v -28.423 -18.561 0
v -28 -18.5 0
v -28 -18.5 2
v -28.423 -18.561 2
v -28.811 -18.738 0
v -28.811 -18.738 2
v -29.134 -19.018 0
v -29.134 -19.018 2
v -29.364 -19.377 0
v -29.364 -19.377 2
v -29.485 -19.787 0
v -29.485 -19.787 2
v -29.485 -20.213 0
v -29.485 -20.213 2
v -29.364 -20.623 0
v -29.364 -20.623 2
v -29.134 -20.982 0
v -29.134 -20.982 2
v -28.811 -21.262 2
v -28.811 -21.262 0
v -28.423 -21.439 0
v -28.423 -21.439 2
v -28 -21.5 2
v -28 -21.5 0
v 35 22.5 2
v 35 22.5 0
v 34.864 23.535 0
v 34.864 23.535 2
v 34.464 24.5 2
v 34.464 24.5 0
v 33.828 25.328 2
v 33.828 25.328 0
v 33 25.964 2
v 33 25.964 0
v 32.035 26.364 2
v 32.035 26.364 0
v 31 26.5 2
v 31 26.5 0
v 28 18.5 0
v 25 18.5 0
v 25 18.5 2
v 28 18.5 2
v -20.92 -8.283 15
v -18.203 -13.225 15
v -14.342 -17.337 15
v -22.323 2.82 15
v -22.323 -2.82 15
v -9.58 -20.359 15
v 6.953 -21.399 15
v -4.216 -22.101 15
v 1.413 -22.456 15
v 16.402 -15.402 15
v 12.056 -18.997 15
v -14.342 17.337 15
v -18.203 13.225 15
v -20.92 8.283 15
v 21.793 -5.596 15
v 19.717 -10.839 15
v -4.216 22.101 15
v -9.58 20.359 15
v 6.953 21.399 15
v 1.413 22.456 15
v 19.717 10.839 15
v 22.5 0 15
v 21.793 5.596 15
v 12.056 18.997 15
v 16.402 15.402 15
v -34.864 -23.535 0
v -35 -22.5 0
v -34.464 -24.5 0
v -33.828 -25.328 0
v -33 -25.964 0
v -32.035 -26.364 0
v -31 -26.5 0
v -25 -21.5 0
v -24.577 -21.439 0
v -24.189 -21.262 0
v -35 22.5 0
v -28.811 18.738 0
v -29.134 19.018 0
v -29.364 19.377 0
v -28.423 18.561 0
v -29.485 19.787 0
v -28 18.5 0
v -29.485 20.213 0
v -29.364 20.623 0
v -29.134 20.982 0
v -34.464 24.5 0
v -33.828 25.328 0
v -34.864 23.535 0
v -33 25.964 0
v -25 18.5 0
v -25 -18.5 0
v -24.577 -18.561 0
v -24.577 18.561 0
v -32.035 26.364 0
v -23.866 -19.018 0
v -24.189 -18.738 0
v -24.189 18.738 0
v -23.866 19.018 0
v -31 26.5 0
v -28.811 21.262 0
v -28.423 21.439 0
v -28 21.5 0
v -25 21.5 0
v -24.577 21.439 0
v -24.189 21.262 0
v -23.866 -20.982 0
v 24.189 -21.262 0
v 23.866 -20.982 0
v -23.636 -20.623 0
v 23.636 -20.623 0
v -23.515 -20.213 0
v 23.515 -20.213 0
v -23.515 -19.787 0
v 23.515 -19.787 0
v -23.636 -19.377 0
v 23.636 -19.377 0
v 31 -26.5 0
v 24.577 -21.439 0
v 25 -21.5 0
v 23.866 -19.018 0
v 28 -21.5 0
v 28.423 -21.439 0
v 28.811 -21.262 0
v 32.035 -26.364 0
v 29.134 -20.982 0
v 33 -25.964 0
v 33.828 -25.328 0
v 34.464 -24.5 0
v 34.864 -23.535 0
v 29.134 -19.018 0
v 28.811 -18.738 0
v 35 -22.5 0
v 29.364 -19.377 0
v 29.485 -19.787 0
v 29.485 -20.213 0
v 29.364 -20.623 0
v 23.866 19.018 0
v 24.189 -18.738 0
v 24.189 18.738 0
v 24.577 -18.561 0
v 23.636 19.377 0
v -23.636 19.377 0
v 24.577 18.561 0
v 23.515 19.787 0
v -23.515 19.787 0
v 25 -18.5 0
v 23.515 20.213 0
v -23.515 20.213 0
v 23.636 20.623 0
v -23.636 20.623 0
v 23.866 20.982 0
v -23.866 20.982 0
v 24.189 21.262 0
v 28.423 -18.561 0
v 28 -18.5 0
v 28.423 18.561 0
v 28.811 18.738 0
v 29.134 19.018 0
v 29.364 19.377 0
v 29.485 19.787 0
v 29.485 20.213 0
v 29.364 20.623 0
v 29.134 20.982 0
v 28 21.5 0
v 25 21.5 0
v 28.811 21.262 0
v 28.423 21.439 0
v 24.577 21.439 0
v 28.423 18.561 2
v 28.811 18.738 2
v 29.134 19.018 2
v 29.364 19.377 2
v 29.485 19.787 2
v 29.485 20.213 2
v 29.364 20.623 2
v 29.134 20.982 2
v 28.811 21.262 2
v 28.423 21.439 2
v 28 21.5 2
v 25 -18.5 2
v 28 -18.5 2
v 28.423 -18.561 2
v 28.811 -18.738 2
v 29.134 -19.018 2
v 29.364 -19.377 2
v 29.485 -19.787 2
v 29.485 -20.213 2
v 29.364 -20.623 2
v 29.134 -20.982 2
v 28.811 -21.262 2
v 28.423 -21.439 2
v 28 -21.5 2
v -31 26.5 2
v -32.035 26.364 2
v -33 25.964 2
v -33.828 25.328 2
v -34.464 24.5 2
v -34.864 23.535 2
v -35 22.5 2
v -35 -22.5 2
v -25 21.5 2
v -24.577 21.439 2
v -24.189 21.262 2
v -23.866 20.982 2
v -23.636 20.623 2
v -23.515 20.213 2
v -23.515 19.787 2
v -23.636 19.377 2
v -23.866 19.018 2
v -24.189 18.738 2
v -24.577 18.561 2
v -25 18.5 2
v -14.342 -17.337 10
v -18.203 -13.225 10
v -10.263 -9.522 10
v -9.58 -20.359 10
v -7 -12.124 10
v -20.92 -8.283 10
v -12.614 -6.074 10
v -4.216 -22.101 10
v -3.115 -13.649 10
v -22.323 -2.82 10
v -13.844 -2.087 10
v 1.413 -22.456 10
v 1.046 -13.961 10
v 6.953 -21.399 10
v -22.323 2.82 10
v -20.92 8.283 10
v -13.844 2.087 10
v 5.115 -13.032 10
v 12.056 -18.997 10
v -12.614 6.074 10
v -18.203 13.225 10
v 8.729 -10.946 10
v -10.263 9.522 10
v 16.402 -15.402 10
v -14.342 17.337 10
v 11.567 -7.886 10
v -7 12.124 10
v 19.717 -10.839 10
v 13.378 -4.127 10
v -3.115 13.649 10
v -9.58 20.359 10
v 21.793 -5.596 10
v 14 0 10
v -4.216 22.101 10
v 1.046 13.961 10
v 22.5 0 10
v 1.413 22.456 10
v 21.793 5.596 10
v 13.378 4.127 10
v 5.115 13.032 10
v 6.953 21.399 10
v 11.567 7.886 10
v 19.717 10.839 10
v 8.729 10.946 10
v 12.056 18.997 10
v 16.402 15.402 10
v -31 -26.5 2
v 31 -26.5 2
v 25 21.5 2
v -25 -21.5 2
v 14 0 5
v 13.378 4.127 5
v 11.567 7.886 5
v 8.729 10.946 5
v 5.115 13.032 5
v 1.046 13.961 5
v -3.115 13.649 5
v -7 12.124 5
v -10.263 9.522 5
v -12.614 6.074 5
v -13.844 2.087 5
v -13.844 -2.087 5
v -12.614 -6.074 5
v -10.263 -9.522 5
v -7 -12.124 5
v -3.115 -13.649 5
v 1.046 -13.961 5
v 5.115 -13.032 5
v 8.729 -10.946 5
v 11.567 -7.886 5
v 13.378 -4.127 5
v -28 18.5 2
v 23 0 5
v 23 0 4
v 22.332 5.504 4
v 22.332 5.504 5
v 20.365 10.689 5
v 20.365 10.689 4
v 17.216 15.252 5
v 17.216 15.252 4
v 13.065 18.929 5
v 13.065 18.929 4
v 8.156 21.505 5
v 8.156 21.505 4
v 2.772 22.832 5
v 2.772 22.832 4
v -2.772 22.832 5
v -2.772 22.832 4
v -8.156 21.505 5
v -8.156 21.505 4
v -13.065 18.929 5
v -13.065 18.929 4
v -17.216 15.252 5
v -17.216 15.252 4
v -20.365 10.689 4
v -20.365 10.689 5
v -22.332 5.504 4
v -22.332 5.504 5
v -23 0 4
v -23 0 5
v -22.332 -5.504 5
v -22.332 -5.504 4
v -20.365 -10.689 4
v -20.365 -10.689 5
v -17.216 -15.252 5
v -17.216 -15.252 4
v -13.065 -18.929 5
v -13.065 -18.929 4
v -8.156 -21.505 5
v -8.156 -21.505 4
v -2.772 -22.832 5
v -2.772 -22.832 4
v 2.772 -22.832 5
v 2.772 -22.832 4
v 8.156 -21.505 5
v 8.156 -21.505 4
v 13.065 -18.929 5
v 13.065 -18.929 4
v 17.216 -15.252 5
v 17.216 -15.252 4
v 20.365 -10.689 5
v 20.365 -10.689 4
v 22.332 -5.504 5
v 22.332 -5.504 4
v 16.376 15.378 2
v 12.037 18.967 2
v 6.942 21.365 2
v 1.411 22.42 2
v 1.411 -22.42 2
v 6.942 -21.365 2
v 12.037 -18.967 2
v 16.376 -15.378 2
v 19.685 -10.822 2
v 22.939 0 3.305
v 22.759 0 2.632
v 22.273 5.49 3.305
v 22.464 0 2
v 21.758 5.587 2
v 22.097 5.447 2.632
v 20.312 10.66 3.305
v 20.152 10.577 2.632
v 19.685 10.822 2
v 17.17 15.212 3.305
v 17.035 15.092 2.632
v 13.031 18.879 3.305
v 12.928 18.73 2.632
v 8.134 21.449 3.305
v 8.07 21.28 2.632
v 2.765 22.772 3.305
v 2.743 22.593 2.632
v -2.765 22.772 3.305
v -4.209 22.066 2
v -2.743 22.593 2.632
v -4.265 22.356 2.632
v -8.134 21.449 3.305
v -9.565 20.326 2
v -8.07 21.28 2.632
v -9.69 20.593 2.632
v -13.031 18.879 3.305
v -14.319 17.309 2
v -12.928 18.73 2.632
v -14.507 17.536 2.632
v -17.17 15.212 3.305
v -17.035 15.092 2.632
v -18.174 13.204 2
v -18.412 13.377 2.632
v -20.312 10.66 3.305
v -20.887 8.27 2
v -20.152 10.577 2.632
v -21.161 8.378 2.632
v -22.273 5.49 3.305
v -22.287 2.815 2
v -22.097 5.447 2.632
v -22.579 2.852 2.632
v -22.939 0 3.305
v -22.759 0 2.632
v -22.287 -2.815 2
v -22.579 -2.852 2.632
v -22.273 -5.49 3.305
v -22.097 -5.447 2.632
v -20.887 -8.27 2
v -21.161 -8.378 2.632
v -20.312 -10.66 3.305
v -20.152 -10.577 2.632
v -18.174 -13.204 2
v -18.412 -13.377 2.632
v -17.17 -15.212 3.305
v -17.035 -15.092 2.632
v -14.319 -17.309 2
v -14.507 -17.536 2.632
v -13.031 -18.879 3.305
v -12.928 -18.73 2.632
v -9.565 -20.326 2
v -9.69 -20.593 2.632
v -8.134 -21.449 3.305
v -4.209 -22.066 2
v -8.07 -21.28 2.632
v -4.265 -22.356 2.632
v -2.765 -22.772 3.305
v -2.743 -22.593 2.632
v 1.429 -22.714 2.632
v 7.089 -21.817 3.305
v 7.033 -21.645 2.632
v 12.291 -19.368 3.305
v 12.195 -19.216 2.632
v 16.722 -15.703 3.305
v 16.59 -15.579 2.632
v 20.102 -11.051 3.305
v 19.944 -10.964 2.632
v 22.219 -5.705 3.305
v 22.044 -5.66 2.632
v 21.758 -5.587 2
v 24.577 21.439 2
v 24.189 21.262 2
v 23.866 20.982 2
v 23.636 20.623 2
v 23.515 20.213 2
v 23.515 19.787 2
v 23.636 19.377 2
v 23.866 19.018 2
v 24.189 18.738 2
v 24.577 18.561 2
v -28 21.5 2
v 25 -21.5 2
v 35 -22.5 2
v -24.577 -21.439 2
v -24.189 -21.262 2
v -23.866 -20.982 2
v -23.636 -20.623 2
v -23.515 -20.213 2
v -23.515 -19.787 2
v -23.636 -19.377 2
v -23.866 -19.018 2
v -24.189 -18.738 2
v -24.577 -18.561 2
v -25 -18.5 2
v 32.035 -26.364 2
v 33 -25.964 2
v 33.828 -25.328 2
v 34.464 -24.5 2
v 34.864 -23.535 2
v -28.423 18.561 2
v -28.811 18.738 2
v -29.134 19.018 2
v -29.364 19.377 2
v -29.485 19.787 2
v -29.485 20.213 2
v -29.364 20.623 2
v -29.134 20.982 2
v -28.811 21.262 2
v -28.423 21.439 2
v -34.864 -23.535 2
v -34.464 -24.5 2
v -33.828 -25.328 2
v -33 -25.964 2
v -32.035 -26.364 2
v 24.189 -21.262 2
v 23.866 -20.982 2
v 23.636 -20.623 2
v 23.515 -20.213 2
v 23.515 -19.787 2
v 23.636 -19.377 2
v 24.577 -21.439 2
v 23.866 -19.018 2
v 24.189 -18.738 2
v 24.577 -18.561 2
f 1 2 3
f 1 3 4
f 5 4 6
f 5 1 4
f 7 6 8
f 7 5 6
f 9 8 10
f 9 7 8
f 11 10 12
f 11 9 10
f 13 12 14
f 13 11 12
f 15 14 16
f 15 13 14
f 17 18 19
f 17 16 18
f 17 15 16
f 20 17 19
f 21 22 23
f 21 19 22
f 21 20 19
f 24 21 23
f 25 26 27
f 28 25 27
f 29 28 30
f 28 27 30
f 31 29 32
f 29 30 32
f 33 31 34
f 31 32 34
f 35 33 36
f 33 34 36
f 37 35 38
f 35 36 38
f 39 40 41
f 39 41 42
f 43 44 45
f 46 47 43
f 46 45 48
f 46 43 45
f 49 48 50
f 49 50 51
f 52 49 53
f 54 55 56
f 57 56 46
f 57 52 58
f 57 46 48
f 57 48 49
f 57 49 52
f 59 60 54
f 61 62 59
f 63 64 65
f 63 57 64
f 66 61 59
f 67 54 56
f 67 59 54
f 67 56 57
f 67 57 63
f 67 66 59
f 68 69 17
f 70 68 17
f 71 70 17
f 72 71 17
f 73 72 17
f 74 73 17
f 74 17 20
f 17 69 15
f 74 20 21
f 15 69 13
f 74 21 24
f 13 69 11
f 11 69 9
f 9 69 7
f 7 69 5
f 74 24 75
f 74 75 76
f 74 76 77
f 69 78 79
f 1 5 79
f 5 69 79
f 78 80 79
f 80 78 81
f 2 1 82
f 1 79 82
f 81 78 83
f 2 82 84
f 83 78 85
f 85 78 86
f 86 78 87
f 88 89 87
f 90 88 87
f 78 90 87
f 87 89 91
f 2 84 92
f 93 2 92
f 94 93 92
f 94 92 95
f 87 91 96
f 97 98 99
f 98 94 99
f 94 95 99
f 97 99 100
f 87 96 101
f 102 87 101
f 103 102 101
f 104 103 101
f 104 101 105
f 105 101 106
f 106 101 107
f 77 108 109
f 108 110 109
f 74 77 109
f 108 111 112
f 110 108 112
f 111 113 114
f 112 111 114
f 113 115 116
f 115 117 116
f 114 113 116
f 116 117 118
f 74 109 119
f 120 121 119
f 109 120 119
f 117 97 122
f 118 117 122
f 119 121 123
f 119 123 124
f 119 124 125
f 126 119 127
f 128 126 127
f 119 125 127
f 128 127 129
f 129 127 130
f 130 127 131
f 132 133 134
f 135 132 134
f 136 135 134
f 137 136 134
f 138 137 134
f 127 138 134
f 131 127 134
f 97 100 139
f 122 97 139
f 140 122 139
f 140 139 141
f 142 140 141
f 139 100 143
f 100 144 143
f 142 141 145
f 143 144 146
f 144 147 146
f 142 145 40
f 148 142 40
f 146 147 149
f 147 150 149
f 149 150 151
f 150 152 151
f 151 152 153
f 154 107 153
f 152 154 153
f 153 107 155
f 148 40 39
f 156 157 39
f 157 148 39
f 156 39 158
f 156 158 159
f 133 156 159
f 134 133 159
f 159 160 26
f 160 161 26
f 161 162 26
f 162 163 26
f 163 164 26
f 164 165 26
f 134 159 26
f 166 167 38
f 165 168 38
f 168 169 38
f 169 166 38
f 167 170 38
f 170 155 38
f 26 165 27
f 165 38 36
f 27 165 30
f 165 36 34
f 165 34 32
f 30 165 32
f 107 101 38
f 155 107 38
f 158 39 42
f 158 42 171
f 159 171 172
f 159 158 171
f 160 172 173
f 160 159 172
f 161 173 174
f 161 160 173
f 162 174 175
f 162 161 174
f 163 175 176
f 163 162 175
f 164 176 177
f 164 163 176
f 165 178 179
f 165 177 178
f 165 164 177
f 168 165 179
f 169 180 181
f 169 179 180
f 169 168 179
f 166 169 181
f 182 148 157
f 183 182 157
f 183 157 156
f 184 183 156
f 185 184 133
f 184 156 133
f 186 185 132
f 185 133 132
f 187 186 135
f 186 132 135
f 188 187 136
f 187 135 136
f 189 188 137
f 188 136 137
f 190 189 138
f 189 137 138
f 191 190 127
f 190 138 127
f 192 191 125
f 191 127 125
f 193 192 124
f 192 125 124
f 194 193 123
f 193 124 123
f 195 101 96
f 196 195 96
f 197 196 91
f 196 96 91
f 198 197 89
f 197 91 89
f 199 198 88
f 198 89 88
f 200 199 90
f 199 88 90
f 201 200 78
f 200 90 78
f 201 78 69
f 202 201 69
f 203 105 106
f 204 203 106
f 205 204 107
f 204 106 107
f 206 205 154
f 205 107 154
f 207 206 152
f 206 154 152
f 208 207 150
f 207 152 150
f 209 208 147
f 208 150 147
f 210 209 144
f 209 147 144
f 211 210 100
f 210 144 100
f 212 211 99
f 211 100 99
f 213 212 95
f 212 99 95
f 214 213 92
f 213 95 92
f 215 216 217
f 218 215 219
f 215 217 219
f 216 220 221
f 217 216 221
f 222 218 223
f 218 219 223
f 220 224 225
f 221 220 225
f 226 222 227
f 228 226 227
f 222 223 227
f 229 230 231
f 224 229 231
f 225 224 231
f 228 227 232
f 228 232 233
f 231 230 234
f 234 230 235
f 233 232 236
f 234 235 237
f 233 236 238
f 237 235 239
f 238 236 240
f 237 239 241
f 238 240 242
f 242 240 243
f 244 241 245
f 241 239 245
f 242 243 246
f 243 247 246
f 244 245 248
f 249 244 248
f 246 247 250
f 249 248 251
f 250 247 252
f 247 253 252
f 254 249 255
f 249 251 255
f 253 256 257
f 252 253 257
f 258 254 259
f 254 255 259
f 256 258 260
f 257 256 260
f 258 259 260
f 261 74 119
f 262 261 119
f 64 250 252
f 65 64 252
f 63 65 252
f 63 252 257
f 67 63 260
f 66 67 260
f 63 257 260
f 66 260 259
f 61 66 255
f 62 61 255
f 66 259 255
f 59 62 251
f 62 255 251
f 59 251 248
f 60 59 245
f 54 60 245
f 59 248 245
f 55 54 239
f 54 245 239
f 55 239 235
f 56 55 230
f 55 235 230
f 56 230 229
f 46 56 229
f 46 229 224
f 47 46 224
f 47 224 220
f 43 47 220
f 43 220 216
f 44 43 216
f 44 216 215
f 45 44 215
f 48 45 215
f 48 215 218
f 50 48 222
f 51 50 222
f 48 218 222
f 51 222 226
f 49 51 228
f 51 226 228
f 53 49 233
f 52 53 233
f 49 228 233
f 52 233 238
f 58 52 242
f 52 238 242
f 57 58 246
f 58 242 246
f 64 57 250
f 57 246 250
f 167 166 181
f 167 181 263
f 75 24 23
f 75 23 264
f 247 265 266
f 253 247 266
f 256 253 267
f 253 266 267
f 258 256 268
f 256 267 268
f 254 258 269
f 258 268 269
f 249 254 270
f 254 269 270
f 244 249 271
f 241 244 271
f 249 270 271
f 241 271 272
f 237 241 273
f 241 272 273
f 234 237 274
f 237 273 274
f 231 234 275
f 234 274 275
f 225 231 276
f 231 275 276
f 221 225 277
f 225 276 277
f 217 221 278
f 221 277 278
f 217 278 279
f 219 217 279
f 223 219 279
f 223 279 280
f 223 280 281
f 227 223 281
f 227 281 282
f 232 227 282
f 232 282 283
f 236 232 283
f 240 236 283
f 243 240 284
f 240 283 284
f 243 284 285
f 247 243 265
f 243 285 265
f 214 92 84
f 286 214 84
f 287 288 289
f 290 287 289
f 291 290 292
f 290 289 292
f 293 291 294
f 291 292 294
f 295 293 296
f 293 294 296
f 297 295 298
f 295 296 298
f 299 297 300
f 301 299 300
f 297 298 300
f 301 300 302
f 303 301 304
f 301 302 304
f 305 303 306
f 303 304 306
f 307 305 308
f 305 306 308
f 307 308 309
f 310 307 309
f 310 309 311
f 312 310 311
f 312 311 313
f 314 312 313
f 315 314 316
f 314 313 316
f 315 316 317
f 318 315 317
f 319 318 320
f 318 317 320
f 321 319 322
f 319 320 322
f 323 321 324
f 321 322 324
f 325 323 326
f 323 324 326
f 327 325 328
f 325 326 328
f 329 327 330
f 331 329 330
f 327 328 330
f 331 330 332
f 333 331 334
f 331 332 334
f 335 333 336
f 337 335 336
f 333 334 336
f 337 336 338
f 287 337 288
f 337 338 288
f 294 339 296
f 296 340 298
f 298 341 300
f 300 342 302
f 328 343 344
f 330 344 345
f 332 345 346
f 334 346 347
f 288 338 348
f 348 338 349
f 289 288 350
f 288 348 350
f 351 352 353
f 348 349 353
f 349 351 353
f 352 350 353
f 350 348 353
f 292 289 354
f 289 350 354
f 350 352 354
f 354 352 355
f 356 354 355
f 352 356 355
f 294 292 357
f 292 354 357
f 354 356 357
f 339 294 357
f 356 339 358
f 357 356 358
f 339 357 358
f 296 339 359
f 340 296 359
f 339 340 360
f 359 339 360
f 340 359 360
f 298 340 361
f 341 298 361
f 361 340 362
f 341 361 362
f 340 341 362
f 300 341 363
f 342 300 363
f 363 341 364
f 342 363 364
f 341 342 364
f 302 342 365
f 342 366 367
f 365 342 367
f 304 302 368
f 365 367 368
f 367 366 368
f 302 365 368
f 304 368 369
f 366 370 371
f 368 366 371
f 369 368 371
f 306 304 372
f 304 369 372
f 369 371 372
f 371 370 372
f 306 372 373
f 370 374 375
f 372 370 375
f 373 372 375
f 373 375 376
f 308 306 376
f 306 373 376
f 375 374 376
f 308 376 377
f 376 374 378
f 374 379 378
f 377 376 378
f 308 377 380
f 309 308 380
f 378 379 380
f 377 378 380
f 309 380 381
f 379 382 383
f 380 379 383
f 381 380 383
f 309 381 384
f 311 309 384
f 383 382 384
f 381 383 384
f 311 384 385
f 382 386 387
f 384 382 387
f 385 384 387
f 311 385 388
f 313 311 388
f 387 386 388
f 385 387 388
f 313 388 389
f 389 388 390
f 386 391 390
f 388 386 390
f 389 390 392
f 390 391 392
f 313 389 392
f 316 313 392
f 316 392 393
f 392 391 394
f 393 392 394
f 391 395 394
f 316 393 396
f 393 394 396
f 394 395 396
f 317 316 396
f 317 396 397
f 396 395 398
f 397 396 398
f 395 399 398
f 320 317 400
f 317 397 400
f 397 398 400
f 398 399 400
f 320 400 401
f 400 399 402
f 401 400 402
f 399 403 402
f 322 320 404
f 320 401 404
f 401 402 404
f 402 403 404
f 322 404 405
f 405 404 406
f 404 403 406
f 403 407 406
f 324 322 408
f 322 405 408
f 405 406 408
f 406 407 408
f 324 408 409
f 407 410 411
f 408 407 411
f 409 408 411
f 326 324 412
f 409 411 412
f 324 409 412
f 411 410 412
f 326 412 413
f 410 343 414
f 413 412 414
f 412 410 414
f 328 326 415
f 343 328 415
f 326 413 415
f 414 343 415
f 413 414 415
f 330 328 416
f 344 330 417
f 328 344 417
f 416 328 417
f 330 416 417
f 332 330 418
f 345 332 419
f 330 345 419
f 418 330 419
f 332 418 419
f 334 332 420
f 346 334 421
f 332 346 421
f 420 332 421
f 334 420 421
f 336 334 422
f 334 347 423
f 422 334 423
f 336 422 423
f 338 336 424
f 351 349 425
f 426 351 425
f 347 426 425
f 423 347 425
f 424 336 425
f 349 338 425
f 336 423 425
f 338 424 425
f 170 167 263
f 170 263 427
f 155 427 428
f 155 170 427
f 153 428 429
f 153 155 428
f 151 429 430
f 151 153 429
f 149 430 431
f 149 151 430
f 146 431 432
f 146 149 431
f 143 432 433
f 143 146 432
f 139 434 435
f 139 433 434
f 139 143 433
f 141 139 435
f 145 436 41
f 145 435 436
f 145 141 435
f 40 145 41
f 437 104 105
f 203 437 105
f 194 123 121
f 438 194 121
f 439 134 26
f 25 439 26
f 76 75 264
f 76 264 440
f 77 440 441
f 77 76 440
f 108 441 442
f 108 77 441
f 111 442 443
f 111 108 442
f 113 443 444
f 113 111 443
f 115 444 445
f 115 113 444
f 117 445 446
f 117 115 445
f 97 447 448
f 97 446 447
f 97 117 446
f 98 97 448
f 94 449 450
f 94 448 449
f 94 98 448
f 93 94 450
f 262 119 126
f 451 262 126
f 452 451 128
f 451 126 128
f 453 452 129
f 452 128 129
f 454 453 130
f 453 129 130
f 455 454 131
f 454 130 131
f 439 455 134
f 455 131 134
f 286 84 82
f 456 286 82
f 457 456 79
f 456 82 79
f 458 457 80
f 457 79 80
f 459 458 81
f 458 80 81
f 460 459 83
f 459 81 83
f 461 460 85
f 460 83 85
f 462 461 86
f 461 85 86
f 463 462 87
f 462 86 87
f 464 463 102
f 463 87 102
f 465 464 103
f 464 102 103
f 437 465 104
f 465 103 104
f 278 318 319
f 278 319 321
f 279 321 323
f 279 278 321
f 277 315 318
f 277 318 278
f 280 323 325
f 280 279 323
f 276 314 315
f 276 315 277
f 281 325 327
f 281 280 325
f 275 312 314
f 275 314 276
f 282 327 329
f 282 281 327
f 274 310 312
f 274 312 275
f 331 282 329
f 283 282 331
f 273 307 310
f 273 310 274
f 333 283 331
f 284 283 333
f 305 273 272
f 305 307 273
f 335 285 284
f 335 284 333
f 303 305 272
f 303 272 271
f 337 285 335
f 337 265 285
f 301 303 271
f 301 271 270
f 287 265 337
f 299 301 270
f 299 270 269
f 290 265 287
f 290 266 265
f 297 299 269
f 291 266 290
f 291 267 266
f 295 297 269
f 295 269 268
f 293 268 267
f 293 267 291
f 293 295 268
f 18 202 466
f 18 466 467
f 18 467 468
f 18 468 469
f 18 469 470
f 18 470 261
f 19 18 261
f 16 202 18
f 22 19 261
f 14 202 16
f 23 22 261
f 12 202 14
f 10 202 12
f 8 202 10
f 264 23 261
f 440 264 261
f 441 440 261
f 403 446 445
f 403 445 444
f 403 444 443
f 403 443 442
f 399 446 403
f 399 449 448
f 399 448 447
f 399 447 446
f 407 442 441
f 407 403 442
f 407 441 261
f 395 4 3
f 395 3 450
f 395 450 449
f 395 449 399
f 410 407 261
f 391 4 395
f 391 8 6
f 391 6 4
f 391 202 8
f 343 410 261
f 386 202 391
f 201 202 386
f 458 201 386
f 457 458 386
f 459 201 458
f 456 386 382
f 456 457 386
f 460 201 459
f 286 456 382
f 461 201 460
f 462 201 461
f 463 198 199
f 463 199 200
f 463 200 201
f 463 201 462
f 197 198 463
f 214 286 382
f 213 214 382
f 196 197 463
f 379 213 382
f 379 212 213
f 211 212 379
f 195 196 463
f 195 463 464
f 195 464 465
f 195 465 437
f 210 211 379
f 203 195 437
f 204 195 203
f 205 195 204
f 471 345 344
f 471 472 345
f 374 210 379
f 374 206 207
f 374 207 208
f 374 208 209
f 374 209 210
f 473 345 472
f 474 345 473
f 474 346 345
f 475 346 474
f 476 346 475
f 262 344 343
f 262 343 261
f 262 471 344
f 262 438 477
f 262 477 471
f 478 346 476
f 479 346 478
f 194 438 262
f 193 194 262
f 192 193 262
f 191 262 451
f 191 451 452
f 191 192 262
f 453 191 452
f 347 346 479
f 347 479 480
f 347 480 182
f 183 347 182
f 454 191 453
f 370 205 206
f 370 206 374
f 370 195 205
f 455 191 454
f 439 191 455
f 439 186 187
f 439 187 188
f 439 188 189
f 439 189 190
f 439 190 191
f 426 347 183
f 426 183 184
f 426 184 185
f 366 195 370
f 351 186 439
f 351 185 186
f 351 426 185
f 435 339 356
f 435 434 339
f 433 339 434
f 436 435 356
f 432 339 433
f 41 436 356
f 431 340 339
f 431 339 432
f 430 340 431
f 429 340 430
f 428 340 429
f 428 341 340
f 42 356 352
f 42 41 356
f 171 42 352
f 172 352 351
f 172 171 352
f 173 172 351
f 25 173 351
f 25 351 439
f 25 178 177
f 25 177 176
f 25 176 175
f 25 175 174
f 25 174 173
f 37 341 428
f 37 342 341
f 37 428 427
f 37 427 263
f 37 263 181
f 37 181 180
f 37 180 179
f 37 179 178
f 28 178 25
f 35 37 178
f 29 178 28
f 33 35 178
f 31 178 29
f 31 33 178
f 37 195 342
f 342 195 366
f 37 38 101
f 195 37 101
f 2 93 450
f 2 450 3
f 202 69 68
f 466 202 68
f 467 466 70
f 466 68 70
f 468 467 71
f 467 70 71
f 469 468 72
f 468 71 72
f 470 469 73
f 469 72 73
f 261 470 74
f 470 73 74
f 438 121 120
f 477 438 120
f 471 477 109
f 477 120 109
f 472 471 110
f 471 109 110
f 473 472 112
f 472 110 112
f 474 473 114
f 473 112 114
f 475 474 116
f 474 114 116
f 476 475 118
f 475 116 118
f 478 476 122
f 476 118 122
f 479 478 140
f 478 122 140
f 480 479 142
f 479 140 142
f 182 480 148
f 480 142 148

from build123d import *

# Parameters (mm, degrees)
SKETCH_1_R          = 23
EXTRUDE_1_DEPTH     = 5
FILLET_1_R          = 4
EXTRUDE_2_DEPTH     = 2
CUT_EXTRUDE_3_DEPTH = 45.18427322
SKETCH_7_R          = 14
EXTRUDE_3_DEPTH     = 5
SKETCH_8_R          = 22.5
EXTRUDE_4_DEPTH     = 5


with BuildPart() as part:
    # 草图1 → 凸台-拉伸1 (new body)
    with BuildSketch(Plane.XY):
        Circle(SKETCH_1_R)
    extrude(amount=EXTRUDE_1_DEPTH)

    # 圆角1
    fillet_1_edges = [part.edges().sort_by_distance(p)[0] for p in [
        (-23, 0, 0),
    ]]
    fillet(fillet_1_edges, radius=FILLET_1_R)

    # 草图4 → 凸台-拉伸2 (add)
    with BuildSketch(Plane.XY):
        with BuildLine():
            Line((-31, -26.5), (31, -26.5))
            ThreePointArc((31, -26.5), (33.828427125, -25.328427125), (35, -22.5))
            Line((35, -22.5), (35, 22.5))
            ThreePointArc((35, 22.5), (33.828427125, 25.328427125), (31, 26.5))
            Line((31, 26.5), (-31, 26.5))
            ThreePointArc((-31, 26.5), (-33.828427125, 25.328427125), (-35, 22.5))
            Line((-35, 22.5), (-35, -22.5))
            ThreePointArc((-35, -22.5), (-33.828427125, -25.328427125), (-31, -26.5))
        make_face()
    extrude(amount=EXTRUDE_2_DEPTH)

    # 草图6 → 切除-拉伸3 (cut, through all)
    with BuildSketch(Plane(origin=(0, 0, 0), x_dir=(-1, 0, 0), z_dir=(0, 0, -1))):
        with BuildLine():
            Line((28, 21.5), (25, 21.5))
            ThreePointArc((25, 21.5), (23.5, 20), (25, 18.5))
            Line((25, 18.5), (28, 18.5))
            ThreePointArc((28, 18.5), (29.5, 20), (28, 21.5))
        make_face()
        with BuildLine():
            Line((25, -18.5), (28, -18.5))
            ThreePointArc((28, -18.5), (29.5, -20), (28, -21.5))
            Line((28, -21.5), (25, -21.5))
            ThreePointArc((25, -21.5), (23.5, -20), (25, -18.5))
        make_face()
        with BuildLine():
            Line((-28, -21.5), (-25, -21.5))
            ThreePointArc((-25, -21.5), (-23.5, -20), (-25, -18.5))
            Line((-25, -18.5), (-28, -18.5))
            ThreePointArc((-28, -18.5), (-29.5, -20), (-28, -21.5))
        make_face()
        with BuildLine():
            Line((-28, 21.5), (-25, 21.5))
            ThreePointArc((-25, 21.5), (-23.5, 20), (-25, 18.5))
            Line((-25, 18.5), (-28, 18.5))
            ThreePointArc((-28, 18.5), (-29.5, 20), (-28, 21.5))
        make_face()
    extrude(amount=-CUT_EXTRUDE_3_DEPTH, mode=Mode.SUBTRACT)

    # 草图7 → 凸台-拉伸3 (add)
    with BuildSketch(Plane.XY.offset(5)):
        Circle(SKETCH_7_R)
    extrude(amount=EXTRUDE_3_DEPTH)

    # 草图8 → 凸台-拉伸4 (add)
    with BuildSketch(Plane.XY.offset(10)):
        Circle(SKETCH_8_R)
    extrude(amount=EXTRUDE_4_DEPTH)


solid = part.part
